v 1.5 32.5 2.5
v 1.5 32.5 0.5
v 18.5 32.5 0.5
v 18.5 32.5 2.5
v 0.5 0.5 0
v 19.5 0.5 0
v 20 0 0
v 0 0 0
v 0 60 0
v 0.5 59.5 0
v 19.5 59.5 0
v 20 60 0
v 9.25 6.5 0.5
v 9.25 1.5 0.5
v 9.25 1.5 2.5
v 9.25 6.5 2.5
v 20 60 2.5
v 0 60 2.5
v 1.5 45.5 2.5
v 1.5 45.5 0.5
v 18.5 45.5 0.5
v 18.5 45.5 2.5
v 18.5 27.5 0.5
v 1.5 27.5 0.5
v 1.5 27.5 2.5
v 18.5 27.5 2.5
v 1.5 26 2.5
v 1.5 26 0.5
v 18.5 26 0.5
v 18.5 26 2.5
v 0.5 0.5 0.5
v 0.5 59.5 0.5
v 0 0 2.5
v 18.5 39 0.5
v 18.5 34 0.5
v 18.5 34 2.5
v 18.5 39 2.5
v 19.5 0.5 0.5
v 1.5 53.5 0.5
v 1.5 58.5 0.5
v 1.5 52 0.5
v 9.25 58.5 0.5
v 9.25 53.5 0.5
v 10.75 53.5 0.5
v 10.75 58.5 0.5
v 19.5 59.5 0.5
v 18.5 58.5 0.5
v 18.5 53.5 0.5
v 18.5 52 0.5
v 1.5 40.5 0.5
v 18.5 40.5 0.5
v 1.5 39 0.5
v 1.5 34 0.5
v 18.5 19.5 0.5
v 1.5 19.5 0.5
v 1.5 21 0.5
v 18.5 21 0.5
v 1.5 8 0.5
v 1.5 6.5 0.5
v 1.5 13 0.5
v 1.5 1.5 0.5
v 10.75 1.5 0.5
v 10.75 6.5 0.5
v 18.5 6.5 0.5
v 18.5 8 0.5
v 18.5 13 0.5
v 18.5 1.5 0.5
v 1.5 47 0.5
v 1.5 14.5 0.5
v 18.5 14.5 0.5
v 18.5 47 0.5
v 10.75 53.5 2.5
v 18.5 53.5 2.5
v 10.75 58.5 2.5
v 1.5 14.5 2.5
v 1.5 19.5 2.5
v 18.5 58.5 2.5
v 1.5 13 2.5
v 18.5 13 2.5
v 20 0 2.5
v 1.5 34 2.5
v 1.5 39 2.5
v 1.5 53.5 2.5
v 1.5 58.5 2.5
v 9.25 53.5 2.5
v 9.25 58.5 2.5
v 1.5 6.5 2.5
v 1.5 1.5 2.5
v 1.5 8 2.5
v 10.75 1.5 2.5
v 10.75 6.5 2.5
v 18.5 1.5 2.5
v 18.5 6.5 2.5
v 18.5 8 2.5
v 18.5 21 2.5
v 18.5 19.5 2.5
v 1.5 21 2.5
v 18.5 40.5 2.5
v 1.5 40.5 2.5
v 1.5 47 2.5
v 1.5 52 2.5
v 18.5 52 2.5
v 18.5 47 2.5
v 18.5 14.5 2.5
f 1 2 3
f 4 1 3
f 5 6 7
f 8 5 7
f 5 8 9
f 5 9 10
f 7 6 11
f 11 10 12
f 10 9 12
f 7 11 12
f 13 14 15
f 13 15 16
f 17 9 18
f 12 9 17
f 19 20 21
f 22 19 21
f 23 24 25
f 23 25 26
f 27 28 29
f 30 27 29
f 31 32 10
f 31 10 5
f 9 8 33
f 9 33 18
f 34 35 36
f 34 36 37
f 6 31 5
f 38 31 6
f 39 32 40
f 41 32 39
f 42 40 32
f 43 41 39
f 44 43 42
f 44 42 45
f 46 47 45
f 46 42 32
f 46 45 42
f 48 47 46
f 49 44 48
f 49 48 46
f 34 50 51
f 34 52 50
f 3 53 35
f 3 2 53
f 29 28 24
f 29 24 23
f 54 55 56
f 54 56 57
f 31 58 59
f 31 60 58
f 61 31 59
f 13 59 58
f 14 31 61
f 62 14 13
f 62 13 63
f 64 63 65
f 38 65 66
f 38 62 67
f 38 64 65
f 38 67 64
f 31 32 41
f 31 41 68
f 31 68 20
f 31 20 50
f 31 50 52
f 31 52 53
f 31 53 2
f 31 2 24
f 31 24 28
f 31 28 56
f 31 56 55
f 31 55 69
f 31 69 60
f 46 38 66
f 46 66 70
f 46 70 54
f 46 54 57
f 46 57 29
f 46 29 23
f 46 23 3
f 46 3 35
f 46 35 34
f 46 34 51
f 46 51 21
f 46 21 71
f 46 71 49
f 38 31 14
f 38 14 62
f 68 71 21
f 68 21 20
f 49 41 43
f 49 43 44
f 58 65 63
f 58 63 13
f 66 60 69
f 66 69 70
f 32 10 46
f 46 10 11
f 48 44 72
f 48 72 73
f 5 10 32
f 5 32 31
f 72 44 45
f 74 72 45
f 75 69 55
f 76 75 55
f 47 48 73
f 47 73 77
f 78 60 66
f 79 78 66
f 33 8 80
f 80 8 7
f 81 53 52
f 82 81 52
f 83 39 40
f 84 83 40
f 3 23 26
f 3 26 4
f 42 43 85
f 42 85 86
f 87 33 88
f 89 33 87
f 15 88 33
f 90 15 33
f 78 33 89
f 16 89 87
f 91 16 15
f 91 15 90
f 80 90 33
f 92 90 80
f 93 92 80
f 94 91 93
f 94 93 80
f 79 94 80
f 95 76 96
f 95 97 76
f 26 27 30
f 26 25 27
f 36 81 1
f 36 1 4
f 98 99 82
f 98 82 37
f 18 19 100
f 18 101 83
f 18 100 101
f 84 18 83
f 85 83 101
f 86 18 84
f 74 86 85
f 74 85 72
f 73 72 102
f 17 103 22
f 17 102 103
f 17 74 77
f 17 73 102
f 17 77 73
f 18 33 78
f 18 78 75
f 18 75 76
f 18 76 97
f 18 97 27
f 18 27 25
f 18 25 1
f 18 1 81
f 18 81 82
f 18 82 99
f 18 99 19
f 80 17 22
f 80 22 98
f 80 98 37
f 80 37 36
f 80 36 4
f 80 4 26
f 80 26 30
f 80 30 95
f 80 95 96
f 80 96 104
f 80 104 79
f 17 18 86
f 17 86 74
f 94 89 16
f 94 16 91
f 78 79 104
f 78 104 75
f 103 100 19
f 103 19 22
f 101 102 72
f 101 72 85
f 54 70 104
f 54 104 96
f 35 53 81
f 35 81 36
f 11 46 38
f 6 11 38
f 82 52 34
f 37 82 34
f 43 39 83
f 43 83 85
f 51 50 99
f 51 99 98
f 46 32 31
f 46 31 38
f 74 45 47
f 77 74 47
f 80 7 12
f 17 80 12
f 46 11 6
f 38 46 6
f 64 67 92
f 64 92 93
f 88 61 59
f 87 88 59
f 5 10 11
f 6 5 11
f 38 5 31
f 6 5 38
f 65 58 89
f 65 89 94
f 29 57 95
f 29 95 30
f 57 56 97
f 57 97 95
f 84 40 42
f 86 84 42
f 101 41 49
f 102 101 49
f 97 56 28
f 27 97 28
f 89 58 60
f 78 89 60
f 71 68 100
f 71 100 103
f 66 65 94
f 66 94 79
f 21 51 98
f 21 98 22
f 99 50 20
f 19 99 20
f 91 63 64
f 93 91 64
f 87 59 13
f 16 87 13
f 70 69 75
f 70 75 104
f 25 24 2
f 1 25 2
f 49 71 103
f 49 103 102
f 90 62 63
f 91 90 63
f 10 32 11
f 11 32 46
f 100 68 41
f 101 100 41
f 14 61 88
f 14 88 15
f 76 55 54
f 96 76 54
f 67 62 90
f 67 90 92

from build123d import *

# Parameters (mm, degrees)
F0_W     = 20
F0_H     = 60
F0_W_2   = 7.75
F0_H_2   = 5
F0_W_3   = 17
F1_DEPTH = 2.5
F2_W     = 19
F2_H     = 59
F3_DEPTH = 0.5
F4_W     = 19
F4_H     = 59
F5_DEPTH = 0.5


with BuildPart() as f1:
    # F0 (on Top) → F1 (new body)
    with BuildSketch(Plane.XY):
        with Locations((10, 30)):
            Rectangle(F0_W, F0_H)
        with Locations((5.375, 4)):
            Rectangle(F0_W_2, F0_H_2, mode=Mode.SUBTRACT)
        with Locations((14.625, 4)):
            Rectangle(F0_W_2, F0_H_2, mode=Mode.SUBTRACT)
        with Locations((10, 10.5)):
            Rectangle(F0_W_3, F0_H_2, mode=Mode.SUBTRACT)
        with Locations((10, 17)):
            Rectangle(F0_W_3, F0_H_2, mode=Mode.SUBTRACT)
        with Locations((10, 23.5)):
            Rectangle(F0_W_3, F0_H_2, mode=Mode.SUBTRACT)
        with Locations((5.375, 56)):
            Rectangle(F0_W_2, F0_H_2, mode=Mode.SUBTRACT)
        with Locations((10, 30)):
            Rectangle(F0_W_3, F0_H_2, mode=Mode.SUBTRACT)
        with Locations((10, 36.5)):
            Rectangle(F0_W_3, F0_H_2, mode=Mode.SUBTRACT)
        with Locations((10, 43)):
            Rectangle(F0_W_3, F0_H_2, mode=Mode.SUBTRACT)
        with Locations((10, 49.5)):
            Rectangle(F0_W_3, F0_H_2, mode=Mode.SUBTRACT)
        with Locations((14.625, 56)):
            Rectangle(F0_W_2, F0_H_2, mode=Mode.SUBTRACT)
    extrude(amount=F1_DEPTH)

    # F2 (on face) → F3 (cut)
    with BuildSketch(Plane(origin=(0, 0, 0), x_dir=(1, 0, 0), z_dir=(0, 0, -1))):
        with Locations((10, -30)):
            Rectangle(F2_W, F2_H)
    extrude(amount=-F3_DEPTH, mode=Mode.SUBTRACT)


with BuildPart() as f5:
    # F4 (on face) → F5 (new body)
    with BuildSketch(Plane(origin=(0, 0, 0.5), x_dir=(1, 0, 0), z_dir=(0, 0, -1))):
        with Locations((10, -30)):
            Rectangle(F4_W, F4_H)
    extrude(amount=F5_DEPTH)


solid = Compound([f1.part, f5.part])
